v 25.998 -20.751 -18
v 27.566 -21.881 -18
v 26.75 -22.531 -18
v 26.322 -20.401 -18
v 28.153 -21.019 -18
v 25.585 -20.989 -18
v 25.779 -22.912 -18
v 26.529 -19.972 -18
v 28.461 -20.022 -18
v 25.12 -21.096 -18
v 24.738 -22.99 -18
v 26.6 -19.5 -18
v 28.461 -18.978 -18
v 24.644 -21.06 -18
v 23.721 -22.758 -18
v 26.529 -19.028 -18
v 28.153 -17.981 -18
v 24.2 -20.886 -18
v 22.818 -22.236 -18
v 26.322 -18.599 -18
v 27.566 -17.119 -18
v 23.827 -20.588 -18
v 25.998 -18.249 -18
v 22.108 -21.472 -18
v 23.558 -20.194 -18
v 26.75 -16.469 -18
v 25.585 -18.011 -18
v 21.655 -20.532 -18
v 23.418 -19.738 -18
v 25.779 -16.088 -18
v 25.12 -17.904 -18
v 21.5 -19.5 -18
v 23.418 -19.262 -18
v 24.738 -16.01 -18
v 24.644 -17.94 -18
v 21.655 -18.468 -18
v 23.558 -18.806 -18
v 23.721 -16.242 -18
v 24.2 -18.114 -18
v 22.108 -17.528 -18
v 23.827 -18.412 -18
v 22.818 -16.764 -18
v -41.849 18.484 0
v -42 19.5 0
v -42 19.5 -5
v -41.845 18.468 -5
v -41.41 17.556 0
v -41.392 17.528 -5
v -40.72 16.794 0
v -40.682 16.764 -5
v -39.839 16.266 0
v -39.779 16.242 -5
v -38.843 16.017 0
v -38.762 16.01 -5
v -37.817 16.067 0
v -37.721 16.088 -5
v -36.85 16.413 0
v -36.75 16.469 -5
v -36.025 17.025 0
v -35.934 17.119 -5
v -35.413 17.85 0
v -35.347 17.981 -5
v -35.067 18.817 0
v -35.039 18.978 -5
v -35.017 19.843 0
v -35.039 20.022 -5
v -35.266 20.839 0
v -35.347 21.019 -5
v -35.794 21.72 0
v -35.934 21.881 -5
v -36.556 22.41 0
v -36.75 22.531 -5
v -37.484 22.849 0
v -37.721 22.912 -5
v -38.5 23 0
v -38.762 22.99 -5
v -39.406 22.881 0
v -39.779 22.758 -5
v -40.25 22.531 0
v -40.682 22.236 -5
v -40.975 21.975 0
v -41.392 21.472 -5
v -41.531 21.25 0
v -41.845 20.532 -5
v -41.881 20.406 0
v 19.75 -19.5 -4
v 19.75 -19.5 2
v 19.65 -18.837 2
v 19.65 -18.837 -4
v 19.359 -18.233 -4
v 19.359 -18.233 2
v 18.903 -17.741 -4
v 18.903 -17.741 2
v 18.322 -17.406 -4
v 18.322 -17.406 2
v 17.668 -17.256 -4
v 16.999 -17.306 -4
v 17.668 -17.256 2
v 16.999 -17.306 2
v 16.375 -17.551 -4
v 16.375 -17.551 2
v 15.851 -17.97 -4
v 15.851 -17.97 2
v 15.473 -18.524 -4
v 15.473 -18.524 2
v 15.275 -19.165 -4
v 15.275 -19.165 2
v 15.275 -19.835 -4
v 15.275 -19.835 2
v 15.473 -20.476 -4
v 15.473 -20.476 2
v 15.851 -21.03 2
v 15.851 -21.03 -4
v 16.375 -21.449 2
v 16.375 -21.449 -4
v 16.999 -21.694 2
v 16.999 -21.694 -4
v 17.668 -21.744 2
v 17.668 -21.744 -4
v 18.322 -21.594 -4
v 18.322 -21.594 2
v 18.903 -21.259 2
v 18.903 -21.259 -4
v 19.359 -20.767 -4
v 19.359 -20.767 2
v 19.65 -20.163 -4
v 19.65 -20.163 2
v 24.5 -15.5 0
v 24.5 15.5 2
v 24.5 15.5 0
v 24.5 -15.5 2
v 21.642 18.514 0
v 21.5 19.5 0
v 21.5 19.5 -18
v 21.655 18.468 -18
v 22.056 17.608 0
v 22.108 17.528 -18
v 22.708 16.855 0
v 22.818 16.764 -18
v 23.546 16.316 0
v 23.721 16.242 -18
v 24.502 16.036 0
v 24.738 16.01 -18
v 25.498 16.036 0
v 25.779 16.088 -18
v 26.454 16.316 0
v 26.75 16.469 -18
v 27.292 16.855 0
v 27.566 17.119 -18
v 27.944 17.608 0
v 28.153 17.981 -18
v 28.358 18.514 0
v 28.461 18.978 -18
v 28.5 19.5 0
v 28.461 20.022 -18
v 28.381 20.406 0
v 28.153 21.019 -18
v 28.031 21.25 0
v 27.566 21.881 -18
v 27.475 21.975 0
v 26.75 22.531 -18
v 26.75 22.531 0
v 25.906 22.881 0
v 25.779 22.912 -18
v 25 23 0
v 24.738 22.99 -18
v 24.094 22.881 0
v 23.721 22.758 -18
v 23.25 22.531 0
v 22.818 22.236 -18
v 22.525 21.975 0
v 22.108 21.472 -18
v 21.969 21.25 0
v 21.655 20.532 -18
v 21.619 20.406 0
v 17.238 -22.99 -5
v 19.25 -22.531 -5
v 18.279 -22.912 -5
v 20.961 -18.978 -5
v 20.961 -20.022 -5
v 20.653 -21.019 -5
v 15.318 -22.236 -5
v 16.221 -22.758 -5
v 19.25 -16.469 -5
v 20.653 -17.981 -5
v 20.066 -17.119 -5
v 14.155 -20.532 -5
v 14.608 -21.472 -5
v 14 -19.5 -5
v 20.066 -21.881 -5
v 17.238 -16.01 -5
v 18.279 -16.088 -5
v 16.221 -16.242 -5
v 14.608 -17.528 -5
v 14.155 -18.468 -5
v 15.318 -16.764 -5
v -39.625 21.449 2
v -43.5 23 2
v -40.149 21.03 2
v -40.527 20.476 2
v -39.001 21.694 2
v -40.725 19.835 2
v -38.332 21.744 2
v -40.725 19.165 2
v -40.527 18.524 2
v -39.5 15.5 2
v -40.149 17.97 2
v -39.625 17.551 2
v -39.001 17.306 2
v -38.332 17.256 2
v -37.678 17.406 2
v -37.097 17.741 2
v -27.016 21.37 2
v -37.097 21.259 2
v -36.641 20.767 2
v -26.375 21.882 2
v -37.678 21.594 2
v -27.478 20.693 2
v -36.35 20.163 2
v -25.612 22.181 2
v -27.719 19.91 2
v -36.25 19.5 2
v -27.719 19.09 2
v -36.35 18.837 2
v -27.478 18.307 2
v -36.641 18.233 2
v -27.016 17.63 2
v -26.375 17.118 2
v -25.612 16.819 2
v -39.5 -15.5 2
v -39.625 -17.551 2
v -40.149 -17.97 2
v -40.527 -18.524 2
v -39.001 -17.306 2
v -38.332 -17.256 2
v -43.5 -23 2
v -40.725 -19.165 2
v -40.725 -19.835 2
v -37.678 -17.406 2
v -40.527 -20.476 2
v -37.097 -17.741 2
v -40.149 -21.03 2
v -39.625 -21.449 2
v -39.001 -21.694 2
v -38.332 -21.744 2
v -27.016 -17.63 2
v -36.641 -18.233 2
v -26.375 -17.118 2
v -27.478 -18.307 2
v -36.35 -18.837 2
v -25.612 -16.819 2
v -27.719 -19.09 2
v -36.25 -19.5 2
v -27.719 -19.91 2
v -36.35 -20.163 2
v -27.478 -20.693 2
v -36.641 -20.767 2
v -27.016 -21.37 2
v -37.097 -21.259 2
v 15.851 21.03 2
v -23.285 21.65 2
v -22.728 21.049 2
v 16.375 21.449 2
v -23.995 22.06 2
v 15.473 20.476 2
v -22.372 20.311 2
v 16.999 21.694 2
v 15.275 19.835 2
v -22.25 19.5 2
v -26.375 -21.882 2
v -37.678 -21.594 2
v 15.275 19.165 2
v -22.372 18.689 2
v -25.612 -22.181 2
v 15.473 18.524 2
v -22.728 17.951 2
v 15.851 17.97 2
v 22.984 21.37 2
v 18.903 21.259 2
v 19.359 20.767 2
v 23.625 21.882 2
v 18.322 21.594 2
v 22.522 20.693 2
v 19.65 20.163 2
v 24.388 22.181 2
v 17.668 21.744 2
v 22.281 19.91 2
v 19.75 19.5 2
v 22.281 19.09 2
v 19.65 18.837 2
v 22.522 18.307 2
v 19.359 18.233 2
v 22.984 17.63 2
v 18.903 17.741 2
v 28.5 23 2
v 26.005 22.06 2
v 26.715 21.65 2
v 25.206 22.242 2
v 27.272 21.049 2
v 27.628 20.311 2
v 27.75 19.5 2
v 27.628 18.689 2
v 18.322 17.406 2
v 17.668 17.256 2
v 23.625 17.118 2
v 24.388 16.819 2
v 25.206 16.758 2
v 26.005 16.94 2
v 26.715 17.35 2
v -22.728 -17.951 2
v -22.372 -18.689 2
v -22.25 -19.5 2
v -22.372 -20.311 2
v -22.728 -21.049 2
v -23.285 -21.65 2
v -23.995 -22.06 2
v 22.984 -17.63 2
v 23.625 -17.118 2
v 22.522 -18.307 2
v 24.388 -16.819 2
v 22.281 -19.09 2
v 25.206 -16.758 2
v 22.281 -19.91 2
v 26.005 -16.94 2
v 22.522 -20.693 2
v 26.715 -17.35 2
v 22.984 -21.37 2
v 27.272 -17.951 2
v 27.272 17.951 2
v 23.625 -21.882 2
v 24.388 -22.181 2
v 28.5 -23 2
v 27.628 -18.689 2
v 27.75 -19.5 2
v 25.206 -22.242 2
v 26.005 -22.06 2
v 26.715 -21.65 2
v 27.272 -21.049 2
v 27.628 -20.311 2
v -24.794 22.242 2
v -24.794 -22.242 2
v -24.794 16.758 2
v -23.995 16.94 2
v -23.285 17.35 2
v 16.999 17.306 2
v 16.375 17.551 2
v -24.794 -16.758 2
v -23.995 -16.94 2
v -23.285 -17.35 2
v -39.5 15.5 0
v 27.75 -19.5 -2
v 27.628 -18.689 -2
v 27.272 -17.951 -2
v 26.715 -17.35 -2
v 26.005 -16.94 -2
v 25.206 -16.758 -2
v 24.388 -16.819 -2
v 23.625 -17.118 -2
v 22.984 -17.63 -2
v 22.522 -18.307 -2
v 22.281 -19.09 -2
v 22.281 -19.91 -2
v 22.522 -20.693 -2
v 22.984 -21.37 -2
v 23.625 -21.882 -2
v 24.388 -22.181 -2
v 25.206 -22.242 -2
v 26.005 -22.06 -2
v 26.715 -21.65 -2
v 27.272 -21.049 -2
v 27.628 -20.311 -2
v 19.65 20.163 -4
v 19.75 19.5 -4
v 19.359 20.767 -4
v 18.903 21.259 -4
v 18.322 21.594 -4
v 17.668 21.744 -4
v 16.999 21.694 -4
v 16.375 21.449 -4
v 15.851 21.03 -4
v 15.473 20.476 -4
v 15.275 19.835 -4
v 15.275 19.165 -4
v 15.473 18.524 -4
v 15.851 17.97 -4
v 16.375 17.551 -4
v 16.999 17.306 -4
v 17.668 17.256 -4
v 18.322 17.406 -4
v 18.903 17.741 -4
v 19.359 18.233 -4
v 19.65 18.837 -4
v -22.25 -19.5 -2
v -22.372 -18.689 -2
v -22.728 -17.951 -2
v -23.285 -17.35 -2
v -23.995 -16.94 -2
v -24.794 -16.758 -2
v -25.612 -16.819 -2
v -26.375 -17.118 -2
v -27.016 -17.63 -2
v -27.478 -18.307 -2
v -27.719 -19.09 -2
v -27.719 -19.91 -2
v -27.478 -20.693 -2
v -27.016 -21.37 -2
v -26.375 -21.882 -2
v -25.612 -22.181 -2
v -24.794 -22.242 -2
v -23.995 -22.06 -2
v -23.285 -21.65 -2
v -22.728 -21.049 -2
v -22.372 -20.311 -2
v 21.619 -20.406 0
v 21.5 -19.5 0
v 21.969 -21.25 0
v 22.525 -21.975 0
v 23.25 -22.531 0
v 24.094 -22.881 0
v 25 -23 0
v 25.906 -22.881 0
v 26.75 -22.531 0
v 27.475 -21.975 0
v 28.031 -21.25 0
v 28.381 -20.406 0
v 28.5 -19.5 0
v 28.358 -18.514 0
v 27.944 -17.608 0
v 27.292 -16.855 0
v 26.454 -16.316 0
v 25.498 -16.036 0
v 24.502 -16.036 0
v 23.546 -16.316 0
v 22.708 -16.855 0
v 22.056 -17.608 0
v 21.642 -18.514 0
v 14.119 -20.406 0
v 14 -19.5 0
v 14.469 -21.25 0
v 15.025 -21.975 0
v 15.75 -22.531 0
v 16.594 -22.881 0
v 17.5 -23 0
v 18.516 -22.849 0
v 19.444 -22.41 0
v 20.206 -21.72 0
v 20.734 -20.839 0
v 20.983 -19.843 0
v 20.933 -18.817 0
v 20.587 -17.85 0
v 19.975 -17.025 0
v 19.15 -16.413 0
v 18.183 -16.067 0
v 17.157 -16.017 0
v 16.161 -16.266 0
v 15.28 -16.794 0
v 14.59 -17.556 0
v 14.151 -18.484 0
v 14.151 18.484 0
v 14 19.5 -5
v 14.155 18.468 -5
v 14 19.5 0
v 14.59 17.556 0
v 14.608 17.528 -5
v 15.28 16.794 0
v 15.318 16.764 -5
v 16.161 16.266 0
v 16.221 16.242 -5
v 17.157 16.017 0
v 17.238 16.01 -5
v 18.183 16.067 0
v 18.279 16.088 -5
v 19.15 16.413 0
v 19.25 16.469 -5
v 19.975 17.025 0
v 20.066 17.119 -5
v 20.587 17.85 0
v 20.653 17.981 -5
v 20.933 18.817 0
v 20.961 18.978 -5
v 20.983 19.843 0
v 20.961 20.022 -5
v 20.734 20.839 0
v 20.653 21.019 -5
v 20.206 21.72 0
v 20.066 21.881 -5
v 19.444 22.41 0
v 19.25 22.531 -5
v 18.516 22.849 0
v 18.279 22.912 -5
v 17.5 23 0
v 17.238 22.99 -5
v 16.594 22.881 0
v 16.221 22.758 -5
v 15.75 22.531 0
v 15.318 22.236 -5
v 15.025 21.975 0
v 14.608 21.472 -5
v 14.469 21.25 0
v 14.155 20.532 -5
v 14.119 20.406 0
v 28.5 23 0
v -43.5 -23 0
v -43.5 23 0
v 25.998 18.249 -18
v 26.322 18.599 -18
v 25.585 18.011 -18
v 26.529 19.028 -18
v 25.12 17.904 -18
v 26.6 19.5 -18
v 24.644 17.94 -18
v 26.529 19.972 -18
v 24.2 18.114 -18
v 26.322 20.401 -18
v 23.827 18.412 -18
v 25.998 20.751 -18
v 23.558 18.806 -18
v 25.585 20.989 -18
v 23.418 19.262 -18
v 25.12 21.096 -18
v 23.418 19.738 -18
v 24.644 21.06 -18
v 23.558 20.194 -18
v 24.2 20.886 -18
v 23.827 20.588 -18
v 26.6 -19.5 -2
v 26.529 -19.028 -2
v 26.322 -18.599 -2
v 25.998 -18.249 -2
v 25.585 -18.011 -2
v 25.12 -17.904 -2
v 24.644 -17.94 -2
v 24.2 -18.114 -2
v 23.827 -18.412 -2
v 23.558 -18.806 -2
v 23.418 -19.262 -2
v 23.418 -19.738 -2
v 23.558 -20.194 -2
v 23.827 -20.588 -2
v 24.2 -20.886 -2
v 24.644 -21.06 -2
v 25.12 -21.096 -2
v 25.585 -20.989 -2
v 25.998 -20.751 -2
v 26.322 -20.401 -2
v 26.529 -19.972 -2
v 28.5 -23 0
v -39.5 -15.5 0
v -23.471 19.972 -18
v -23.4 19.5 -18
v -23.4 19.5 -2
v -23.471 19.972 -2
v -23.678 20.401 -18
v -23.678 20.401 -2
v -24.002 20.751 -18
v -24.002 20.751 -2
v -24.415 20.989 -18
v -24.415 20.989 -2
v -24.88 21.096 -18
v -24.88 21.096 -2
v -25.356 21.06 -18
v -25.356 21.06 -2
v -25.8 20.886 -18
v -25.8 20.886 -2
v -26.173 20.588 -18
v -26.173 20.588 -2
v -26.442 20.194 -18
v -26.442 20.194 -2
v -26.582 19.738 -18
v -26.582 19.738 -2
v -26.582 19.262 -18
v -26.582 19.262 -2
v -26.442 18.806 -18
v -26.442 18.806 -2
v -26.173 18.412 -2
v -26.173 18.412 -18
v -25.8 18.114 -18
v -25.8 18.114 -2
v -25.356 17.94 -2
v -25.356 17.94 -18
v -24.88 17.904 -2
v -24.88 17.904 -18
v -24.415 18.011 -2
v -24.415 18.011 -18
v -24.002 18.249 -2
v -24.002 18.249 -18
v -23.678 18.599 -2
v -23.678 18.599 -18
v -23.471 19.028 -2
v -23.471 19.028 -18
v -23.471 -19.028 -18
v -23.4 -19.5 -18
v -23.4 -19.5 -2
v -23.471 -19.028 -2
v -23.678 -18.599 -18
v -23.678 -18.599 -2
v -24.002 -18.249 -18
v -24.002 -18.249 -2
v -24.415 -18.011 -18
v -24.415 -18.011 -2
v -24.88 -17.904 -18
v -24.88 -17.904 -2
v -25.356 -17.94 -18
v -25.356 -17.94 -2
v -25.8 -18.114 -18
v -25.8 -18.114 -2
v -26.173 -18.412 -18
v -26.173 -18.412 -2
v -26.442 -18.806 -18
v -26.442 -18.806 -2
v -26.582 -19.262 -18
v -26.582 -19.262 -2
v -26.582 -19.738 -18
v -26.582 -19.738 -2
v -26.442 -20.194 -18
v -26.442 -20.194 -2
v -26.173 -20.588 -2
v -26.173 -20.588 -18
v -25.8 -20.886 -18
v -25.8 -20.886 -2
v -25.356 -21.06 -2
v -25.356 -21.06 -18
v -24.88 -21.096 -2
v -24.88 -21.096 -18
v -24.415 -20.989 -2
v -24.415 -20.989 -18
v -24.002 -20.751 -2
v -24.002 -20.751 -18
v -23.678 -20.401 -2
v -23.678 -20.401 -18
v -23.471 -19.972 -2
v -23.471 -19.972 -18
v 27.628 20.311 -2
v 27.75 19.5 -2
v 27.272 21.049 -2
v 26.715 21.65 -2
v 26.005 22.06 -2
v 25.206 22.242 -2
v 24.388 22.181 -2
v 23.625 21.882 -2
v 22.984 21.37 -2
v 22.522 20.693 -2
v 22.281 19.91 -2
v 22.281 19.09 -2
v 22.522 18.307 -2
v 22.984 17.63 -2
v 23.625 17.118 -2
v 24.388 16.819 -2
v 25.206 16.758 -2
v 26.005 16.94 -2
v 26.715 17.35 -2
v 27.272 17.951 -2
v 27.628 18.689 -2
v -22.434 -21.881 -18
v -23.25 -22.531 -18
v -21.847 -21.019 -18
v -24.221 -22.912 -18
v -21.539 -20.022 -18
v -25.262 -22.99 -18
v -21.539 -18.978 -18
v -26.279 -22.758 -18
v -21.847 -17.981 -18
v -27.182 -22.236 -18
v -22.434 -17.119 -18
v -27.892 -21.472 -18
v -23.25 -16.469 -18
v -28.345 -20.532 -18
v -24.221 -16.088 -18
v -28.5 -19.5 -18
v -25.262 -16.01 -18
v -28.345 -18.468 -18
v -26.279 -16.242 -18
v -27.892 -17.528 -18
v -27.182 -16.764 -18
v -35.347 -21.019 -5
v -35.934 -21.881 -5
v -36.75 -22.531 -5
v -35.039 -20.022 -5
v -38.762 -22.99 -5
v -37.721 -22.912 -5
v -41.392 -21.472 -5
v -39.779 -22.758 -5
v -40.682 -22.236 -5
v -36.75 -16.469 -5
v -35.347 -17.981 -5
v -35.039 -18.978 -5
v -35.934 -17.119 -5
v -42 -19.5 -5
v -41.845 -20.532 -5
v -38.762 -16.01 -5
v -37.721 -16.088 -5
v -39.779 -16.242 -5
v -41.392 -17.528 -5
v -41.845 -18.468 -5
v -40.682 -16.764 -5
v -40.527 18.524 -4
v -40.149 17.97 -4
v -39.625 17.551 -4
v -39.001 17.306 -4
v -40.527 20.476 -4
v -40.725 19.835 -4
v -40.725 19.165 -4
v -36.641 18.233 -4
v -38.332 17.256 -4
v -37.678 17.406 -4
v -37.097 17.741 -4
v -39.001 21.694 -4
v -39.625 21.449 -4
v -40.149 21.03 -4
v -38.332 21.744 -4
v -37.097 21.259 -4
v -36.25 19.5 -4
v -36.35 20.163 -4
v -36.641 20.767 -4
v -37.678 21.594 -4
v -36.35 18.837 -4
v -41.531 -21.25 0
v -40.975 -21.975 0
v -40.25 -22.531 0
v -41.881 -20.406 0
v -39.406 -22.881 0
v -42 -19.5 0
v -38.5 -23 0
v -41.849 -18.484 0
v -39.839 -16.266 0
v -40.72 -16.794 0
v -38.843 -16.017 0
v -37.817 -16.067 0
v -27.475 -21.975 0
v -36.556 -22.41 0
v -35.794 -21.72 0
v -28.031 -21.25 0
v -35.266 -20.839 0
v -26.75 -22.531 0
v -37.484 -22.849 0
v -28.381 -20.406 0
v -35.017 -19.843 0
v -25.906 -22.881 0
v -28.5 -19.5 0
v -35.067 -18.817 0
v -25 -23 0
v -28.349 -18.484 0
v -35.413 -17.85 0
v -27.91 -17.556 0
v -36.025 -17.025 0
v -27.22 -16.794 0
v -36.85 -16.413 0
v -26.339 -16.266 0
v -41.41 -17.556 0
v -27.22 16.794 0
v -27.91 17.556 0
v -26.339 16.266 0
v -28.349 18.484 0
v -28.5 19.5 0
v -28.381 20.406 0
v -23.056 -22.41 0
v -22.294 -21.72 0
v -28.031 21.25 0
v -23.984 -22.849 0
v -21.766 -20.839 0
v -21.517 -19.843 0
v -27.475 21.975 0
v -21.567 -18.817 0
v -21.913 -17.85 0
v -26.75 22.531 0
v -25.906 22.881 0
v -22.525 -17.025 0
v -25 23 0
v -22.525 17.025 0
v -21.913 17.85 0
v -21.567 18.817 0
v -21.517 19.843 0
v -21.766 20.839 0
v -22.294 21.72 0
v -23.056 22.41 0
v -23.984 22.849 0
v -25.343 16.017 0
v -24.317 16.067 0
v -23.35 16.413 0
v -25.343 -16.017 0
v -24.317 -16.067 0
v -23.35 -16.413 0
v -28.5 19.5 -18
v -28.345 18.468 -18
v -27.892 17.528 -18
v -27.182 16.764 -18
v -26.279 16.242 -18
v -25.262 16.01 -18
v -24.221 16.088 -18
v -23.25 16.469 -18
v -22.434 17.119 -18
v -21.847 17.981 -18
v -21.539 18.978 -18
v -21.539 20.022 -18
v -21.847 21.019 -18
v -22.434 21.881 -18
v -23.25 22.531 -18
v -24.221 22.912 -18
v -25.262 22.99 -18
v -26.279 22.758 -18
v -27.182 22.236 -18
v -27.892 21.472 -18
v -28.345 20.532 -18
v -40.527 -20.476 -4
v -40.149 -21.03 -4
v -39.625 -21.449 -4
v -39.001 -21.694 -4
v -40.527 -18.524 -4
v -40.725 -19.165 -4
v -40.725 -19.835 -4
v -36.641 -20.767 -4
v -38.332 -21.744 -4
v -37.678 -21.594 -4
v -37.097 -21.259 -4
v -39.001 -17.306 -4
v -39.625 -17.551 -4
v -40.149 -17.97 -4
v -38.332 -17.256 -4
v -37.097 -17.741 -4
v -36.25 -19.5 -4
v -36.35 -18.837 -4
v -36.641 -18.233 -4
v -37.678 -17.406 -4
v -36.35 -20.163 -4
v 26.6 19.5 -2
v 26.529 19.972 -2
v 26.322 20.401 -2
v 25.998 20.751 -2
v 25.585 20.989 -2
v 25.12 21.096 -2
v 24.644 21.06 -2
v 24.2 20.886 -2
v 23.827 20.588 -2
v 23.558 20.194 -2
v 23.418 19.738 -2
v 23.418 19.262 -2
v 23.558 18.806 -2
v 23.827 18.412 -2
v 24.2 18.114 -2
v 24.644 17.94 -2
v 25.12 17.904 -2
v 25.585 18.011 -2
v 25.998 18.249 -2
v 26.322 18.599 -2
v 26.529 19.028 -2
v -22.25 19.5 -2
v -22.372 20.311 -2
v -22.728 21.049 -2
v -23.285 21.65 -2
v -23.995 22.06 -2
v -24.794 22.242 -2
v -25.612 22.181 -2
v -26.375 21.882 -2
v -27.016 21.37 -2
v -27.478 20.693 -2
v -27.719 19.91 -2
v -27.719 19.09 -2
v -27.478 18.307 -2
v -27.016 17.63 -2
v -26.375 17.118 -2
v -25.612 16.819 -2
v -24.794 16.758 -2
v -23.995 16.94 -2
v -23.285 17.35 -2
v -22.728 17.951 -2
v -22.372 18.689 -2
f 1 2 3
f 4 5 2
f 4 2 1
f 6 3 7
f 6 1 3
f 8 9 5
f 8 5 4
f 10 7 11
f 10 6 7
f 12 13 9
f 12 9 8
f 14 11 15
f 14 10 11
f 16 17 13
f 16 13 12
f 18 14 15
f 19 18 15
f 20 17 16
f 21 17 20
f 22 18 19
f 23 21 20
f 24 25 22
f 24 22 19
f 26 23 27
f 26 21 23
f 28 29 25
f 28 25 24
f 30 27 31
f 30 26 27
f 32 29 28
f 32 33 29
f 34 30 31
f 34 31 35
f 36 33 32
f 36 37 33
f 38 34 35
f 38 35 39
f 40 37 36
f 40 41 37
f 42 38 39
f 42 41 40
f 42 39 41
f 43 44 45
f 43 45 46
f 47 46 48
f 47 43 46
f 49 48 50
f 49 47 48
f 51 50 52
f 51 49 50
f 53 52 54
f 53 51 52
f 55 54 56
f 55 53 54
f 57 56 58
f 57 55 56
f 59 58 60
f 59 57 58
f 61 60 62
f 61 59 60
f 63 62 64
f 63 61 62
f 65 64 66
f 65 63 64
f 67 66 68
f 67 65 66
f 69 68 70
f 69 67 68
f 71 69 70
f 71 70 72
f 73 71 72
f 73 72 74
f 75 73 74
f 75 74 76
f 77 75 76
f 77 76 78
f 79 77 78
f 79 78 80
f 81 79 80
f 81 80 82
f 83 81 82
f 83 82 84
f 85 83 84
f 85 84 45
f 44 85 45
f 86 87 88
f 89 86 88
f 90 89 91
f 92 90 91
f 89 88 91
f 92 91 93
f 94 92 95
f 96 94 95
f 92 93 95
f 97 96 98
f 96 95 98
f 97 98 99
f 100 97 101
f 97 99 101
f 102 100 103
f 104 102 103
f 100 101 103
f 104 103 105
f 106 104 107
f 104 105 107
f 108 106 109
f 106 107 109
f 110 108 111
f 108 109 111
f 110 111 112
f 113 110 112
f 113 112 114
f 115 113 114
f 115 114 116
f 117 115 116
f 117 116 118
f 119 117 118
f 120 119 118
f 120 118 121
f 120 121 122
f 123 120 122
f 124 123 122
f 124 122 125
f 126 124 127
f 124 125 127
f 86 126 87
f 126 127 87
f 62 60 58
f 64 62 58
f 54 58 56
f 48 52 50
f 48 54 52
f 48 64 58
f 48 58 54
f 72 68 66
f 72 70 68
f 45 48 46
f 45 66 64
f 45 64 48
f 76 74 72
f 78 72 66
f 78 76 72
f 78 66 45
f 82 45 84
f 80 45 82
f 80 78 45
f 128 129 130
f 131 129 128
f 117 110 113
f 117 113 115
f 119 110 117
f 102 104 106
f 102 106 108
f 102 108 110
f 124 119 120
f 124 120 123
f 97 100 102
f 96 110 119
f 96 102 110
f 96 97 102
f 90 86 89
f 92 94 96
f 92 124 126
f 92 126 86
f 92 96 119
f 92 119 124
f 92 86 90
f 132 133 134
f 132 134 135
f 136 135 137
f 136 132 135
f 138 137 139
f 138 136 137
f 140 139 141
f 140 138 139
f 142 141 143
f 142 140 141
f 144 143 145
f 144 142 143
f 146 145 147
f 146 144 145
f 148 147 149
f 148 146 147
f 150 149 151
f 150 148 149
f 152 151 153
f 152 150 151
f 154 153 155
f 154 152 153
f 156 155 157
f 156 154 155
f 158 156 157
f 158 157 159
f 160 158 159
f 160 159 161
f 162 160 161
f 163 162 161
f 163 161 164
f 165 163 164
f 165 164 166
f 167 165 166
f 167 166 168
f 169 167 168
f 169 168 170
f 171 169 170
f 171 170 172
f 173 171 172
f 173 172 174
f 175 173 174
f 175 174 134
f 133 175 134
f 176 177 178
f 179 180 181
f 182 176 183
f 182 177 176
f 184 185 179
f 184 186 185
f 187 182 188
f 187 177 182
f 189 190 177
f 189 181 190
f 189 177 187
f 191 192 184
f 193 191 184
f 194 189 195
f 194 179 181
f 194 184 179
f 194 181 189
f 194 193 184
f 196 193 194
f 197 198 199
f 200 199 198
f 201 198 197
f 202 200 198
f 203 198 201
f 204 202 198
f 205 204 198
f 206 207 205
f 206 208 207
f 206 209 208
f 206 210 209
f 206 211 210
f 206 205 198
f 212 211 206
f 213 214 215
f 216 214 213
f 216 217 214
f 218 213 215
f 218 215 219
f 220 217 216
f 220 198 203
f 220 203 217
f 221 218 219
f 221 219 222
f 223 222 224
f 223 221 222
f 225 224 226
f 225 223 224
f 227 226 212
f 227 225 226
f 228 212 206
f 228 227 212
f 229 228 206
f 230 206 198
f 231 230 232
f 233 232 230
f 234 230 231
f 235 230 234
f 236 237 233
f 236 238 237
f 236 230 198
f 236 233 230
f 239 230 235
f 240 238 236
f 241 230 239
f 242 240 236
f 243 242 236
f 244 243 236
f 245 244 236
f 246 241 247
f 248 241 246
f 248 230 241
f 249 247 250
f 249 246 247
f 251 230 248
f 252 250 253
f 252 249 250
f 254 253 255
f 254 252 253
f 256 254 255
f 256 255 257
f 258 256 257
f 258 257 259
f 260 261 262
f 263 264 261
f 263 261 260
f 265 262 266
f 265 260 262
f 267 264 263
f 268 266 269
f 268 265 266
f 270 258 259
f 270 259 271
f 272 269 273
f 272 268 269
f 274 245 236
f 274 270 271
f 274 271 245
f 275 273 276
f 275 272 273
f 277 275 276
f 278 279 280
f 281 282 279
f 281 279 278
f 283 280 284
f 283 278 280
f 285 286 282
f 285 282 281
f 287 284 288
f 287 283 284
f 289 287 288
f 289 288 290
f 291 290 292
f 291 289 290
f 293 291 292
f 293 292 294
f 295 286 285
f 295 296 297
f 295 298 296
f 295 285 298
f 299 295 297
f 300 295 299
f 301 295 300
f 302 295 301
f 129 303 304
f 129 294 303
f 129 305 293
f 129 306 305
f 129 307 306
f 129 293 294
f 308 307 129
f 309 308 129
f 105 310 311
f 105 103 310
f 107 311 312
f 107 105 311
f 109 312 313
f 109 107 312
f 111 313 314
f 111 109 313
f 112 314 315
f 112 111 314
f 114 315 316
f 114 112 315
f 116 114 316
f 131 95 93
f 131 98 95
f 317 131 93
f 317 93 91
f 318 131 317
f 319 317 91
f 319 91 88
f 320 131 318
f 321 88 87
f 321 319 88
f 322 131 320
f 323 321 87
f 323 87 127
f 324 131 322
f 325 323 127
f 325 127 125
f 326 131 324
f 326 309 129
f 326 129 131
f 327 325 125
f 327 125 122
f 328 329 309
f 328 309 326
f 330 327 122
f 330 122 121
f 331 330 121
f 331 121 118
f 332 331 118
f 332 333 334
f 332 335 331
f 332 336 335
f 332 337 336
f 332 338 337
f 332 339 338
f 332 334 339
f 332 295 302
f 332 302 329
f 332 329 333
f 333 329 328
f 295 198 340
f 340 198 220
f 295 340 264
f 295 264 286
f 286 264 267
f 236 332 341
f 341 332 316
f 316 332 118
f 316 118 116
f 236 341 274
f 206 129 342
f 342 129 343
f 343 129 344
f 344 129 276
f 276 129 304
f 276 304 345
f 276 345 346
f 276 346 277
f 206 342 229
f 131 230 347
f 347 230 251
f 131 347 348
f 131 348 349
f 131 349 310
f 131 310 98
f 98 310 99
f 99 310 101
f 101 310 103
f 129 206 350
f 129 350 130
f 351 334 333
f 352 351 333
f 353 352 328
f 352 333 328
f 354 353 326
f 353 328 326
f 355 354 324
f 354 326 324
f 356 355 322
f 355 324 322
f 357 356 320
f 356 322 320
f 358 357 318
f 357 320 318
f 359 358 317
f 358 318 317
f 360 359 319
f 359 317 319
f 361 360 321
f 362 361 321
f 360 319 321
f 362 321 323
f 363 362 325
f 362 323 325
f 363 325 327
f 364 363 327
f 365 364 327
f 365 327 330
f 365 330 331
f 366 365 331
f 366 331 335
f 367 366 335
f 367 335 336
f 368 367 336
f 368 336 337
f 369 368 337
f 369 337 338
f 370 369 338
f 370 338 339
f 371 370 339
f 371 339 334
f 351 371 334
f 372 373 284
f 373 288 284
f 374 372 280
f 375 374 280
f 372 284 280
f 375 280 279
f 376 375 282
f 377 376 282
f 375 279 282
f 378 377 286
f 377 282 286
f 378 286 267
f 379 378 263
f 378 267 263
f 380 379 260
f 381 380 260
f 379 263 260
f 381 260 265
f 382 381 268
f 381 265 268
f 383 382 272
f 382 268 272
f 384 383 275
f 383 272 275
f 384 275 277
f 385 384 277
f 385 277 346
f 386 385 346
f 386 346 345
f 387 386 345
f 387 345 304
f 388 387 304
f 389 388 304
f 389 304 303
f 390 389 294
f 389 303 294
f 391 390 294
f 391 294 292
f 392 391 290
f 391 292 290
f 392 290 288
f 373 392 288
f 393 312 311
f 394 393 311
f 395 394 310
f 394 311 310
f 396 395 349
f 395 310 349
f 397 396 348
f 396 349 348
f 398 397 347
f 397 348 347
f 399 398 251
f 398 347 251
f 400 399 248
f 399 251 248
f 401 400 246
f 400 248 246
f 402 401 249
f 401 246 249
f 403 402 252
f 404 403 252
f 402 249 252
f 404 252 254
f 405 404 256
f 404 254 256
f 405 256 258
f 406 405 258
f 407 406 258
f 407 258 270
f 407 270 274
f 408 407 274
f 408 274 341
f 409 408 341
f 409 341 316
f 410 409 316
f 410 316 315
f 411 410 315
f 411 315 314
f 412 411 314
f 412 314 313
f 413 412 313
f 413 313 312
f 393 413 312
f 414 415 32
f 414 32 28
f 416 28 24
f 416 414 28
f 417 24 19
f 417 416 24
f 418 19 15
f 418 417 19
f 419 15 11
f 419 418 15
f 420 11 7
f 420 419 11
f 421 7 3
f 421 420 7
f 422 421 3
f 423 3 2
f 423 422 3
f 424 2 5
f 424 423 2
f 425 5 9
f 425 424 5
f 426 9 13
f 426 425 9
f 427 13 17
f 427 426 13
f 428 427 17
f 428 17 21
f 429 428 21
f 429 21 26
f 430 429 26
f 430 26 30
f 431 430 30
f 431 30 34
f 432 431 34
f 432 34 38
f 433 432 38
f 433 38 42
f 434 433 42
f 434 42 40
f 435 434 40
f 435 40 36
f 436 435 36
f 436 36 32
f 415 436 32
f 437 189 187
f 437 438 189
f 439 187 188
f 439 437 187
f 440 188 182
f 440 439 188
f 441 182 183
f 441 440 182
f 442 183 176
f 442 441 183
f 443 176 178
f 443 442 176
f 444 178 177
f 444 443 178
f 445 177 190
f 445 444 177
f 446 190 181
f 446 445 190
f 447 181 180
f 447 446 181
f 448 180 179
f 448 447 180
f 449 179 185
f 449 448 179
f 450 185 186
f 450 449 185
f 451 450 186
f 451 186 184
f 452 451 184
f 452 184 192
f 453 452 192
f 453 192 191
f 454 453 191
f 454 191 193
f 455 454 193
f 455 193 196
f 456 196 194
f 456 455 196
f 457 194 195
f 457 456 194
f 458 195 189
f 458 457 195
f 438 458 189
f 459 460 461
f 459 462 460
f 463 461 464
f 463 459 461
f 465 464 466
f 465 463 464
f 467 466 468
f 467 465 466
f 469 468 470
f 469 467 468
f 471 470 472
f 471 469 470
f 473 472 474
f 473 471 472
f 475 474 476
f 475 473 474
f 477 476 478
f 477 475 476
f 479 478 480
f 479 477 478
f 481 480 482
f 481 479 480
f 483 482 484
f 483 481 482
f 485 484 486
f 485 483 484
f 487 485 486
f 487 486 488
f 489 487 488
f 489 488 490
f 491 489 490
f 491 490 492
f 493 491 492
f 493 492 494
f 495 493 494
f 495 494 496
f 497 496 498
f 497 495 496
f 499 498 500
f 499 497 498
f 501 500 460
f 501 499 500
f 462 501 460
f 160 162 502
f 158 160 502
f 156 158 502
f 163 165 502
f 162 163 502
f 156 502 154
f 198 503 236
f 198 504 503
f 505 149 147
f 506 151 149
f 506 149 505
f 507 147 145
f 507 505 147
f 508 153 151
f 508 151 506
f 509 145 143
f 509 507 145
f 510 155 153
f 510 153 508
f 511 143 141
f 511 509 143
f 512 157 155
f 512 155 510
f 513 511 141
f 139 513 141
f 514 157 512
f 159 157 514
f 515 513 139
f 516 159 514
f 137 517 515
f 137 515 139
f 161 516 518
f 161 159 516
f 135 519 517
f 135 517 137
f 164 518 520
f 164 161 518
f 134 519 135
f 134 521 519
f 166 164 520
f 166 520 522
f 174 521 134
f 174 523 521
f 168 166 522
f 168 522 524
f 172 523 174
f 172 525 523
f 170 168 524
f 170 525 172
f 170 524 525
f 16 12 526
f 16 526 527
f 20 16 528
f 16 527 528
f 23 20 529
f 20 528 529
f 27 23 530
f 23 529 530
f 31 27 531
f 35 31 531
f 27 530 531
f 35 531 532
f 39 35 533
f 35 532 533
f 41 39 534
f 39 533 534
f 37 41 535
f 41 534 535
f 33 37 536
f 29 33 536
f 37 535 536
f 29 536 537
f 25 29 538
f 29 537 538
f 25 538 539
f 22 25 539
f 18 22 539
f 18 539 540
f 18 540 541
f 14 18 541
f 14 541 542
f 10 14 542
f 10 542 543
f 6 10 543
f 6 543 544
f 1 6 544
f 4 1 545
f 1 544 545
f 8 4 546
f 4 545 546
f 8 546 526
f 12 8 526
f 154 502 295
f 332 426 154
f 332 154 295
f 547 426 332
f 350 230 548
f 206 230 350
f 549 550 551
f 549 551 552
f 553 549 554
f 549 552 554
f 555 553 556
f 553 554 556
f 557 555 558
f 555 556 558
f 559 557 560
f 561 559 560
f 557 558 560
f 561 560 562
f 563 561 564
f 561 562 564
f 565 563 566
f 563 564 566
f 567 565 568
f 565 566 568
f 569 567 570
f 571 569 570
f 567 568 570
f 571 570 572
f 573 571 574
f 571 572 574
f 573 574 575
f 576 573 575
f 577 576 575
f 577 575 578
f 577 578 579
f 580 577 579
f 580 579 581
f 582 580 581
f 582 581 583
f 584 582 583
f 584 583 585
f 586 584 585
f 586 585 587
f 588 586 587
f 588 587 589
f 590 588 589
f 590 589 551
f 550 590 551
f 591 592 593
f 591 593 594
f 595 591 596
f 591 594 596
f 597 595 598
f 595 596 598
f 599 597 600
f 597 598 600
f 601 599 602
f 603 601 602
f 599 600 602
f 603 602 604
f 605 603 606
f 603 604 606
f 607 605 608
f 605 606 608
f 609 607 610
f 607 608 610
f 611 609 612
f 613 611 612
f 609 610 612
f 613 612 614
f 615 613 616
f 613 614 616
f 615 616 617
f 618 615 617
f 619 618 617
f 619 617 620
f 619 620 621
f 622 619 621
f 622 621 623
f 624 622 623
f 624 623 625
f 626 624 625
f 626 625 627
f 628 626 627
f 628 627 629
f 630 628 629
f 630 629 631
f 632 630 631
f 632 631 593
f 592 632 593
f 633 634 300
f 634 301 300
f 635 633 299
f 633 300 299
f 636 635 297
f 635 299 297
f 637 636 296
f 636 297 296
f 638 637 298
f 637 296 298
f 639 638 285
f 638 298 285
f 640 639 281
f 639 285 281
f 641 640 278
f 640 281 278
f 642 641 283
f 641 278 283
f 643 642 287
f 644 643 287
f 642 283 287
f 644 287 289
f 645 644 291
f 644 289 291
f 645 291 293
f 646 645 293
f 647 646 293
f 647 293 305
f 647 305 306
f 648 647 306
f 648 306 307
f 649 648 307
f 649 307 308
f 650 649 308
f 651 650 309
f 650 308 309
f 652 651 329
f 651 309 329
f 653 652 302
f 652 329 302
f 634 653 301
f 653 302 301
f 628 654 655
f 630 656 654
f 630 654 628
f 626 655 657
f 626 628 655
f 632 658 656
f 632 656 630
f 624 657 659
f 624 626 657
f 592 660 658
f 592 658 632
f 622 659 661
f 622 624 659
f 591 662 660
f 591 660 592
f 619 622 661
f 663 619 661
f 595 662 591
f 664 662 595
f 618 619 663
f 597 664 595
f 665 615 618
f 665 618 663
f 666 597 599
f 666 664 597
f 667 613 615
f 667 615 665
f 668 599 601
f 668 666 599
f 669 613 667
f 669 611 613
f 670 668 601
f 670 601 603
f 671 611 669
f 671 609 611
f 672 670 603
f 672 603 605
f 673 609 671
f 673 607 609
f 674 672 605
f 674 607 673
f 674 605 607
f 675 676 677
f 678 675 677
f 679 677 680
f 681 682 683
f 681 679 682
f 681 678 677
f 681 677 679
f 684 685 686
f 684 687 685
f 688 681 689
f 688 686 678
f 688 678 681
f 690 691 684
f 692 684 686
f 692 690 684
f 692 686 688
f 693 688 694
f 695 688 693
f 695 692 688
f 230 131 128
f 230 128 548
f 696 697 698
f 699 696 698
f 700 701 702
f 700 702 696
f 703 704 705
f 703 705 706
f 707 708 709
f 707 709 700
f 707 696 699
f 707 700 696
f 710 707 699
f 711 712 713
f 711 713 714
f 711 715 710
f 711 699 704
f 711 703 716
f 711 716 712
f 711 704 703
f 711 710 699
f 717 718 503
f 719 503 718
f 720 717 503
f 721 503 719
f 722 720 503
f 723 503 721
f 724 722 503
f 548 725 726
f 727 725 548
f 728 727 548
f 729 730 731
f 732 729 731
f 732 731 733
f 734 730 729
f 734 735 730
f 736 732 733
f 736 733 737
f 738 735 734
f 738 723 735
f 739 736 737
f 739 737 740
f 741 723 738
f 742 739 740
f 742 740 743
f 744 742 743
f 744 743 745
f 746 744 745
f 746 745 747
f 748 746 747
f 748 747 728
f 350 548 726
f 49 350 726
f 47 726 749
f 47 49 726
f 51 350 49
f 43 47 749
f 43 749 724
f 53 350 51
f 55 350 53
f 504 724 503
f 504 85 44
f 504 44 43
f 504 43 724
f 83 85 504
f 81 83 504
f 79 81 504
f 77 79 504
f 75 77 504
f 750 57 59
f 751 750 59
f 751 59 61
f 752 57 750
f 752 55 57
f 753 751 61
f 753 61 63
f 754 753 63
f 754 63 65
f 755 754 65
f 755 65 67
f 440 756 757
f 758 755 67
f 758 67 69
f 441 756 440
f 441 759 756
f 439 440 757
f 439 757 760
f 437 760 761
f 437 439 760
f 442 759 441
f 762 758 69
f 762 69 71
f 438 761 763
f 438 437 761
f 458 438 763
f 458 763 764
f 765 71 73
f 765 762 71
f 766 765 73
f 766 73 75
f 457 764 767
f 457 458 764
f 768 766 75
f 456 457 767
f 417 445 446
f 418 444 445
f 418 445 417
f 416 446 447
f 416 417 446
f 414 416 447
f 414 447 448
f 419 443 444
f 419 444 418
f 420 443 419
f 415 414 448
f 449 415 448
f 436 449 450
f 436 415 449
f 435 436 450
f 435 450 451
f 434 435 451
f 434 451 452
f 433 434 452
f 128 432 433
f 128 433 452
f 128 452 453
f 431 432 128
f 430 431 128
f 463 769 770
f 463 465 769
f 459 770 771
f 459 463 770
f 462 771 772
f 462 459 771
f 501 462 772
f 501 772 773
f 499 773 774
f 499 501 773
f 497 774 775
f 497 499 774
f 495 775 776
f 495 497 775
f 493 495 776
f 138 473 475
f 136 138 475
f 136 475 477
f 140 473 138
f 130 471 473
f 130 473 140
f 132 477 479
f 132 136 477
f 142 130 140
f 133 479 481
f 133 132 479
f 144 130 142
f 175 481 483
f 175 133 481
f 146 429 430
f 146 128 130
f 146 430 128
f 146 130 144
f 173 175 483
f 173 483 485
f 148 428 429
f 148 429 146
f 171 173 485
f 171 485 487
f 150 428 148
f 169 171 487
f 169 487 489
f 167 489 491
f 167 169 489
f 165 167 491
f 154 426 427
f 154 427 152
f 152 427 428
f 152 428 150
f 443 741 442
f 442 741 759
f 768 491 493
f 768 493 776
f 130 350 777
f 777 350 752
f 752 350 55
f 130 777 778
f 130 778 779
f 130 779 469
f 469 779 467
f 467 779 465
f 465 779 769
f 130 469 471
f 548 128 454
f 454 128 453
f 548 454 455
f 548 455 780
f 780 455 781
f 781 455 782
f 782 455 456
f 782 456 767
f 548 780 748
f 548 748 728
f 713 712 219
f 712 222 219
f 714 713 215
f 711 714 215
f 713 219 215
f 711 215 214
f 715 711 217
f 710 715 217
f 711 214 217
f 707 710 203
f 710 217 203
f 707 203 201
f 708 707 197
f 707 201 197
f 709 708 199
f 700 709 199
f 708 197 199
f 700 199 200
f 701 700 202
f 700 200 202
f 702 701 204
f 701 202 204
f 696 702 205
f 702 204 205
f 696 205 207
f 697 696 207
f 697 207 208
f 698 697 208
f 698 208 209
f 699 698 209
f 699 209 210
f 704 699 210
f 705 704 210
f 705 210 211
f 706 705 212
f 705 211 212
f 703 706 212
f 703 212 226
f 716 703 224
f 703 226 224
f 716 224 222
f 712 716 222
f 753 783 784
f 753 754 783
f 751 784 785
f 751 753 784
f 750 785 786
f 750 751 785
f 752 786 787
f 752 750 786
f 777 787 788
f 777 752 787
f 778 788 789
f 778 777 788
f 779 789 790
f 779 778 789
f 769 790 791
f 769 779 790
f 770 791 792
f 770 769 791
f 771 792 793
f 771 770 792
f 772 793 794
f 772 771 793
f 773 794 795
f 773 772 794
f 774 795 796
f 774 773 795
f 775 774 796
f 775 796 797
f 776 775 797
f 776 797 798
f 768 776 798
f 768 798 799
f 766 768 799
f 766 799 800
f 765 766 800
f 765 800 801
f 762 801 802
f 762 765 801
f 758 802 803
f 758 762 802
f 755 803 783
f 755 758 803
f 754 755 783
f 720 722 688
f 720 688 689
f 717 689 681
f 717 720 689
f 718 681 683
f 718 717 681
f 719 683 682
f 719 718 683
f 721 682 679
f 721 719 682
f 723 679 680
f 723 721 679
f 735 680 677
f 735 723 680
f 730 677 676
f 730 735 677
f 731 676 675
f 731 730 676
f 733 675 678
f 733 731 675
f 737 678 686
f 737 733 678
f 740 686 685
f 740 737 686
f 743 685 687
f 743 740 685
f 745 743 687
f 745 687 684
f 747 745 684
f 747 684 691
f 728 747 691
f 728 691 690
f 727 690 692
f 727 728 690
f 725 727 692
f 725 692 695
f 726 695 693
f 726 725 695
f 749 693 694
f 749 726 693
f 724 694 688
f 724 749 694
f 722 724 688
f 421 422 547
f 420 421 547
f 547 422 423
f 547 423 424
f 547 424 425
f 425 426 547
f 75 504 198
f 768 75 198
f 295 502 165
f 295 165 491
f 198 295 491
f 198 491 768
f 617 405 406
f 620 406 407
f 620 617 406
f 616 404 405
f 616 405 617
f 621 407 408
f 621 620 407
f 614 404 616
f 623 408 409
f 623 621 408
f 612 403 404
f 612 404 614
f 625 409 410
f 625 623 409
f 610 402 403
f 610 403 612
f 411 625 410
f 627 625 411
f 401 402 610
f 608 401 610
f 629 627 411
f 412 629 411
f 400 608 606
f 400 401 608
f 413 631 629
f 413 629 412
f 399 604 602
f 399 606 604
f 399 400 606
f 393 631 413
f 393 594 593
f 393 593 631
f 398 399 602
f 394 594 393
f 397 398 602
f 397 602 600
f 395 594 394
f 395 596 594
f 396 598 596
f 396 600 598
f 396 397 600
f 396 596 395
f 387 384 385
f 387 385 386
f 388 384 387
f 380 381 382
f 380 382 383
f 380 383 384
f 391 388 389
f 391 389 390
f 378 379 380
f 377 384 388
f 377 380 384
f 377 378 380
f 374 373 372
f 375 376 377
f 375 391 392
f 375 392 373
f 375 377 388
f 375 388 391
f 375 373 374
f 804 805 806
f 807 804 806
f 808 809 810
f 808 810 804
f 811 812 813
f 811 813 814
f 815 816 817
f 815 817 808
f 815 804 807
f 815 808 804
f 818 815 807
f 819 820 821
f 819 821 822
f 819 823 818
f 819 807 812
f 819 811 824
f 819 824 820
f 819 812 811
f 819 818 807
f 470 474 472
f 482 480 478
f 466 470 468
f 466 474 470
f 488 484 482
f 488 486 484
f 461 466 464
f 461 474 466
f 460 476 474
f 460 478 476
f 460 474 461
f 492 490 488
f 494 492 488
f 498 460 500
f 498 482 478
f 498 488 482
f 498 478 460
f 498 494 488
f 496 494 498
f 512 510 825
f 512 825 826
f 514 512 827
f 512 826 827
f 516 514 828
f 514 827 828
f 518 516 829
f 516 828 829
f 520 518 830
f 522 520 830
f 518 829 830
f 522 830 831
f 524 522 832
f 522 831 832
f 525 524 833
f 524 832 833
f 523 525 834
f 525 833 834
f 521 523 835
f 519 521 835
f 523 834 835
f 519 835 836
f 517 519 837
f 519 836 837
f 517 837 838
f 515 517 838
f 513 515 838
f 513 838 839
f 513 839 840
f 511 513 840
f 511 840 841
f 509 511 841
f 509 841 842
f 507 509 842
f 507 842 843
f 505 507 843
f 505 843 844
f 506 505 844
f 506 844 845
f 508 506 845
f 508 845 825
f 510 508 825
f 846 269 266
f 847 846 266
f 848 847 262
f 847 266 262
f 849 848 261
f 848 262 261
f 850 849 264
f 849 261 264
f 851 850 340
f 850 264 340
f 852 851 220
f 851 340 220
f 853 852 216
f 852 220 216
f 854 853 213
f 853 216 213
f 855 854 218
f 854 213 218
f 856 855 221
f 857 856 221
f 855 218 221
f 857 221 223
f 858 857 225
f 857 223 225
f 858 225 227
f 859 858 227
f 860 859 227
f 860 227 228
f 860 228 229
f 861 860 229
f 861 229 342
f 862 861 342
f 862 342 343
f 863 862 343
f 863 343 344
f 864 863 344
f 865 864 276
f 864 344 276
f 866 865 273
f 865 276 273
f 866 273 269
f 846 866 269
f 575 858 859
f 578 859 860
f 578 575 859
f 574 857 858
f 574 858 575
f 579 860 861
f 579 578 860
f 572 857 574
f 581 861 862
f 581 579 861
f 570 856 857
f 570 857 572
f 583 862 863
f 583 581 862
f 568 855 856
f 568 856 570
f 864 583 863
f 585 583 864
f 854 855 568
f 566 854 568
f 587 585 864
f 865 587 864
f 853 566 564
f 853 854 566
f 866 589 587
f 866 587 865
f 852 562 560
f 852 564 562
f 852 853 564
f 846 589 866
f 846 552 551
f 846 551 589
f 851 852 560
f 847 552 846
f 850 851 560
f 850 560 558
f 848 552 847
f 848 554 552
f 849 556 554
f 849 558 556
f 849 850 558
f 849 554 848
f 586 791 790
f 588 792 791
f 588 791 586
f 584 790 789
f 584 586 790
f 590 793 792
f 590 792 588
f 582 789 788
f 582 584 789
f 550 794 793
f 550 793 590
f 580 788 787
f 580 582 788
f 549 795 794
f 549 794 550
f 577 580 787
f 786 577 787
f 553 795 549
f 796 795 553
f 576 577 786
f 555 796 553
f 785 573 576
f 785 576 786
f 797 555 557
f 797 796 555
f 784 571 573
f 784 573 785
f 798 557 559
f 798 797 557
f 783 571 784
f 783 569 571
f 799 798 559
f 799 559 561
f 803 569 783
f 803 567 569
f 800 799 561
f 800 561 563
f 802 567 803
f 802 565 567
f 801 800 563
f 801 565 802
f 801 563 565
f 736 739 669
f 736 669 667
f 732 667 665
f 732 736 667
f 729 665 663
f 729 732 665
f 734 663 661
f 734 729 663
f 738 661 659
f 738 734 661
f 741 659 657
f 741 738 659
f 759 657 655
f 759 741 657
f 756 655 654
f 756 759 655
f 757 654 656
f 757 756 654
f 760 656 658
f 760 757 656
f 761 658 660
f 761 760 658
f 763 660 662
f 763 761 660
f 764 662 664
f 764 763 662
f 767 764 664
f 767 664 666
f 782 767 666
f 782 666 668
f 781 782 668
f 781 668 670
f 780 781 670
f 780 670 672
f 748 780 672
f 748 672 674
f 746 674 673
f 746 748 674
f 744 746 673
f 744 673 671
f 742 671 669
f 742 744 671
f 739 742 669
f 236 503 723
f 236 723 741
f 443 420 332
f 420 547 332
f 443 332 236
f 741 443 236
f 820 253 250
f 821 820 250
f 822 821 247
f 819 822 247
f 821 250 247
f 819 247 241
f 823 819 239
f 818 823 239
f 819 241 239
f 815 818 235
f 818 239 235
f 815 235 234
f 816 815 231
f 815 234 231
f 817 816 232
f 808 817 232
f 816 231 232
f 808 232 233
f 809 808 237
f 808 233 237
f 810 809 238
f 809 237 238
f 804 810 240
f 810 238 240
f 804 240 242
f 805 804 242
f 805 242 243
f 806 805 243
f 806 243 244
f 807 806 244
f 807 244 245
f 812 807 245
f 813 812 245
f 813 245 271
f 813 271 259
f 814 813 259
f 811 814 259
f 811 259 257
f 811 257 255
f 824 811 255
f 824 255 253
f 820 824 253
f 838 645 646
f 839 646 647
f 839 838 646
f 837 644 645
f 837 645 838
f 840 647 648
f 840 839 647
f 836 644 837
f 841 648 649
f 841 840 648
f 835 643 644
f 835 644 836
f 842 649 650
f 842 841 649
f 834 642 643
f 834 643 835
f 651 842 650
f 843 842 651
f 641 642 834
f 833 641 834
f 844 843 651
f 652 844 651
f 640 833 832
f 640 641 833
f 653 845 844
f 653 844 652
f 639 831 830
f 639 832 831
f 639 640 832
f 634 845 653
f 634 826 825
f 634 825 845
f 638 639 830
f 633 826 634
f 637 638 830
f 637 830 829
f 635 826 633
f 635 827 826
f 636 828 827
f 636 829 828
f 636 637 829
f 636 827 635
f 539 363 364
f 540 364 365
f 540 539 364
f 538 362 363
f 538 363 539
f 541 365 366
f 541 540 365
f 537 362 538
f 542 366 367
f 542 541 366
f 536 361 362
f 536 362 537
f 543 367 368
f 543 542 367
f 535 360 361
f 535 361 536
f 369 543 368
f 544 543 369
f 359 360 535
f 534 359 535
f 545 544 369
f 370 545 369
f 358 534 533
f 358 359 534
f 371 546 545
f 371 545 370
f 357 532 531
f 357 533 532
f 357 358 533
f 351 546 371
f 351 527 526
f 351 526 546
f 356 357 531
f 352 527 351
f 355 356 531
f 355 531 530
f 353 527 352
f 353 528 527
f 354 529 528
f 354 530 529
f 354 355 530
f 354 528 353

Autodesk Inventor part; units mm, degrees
ref_plane "YZ Plane" through (0, 0, 0) normal (1, 0, 0) x (0, 1, 0)
ref_plane "XZ Plane" through (0, 0, 0) normal (0, 1, 0) x (-1, 0, 0)
ref_plane "XY Plane" through (0, 0, 0) normal (0, 0, 1) x (1, 0, 0)
sketch "Skizze1" plane through (0, 0, 0) normal (0, 0, 1) x (1, 0, 0)
  line L0 (-28.5, 23) -> (28.5, 23)
  line L1 (28.5, 23) -> (28.5, -23)
  line L2 (28.5, -23) -> (-28.5, -23)
  line L3 (-28.5, -23) -> (-28.5, 23)
  line L4 (0, 32.2) -> (0, -32.2) projected
  line L5 (-39.9, 0) -> (39.9, 0) projected
  point P0 (0, 0)
  point P1 (0, 23)
  point P2 (-28.5, 0)
  dimension "d0" = 57
  dimension "d1" = 46
extrude "Extrusion1" add sketch "Skizze1" along normal blind 2
sketch "Skizze2" plane through (0, 0, 0) normal (0, 0, -1) x (-1, 0, 0)
  circle A0 centre (25, -19.5) radius 3.5
  circle A1 centre (-25, -19.5) radius 3.5
  circle A2 centre (25, 19.5) radius 3.5
  circle A3 centre (-25, 19.5) radius 3.5
  line L0 (28.5, -23) -> (-28.5, -23) projected
  line L1 (28.5, 23) -> (28.5, -23) projected
  line L2 (-28.5, -23) -> (-28.5, 23) projected
  line L3 (-28.5, 23) -> (28.5, 23) projected
  point P0 (0, 0)
  dimension "d4" = 7
  dimension "d5" = 7
  dimension "d6" = 7
  dimension "d7" = 7
  dimension "d8" = 3.5
  dimension "d9" = 3.5
  dimension "d10" = 3.5
  dimension "d11" = 3.5
  dimension "d12" = 3.5
  dimension "d13" = 3.5
  dimension "d14" = 3.5
  dimension "d15" = 3.5
extrude "Extrusion2" add sketch "Skizze2" along normal blind 18 contours A0 | A2 | A1 | A3
sketch "Skizze3" plane through (0, 0, 2) normal (0, 0, 1) x (1, 0, 0)
  circle A0 centre (-25, 19.5) radius 2.75
  circle A1 centre (25, 19.5) radius 2.75
  circle A2 centre (-25, -19.5) radius 2.75
  circle A3 centre (25, -19.5) radius 2.75
  line L0 (28.5, 23) -> (-28.5, 23) projected
  line L1 (-28.5, 23) -> (-28.5, -23) projected
  line L2 (28.5, -23) -> (28.5, 23) projected
  line L3 (-28.5, -23) -> (28.5, -23) projected
  point P0 (0, 0)
  dimension "d18" = 5.5
  dimension "d19" = 5.5
  dimension "d20" = 5.5
  dimension "d21" = 5.5
  dimension "d22" = 3.5
  dimension "d23" = 3.5
  dimension "d24" = 3.5
  dimension "d25" = 3.5
  dimension "d26" = 3.5
  dimension "d27" = 3.5
  dimension "d28" = 3.5
  dimension "d29" = 3.5
extrude "Extrusion3" cut sketch "Skizze3" against normal blind 4 contours A0 | A1 | A2 | A3
sketch "Skizze4" plane through (-25, 19.5, -2) normal (0, 0, 1) x (1, 0, 0)
  circle A0 centre (0, 0) radius 2.75 projected
  circle A1 centre (0, 0) radius 1.6
  circle A2 centre (50, 0) radius 2.75 projected
  circle A3 centre (50, 0) radius 1.6
  circle A4 centre (50, -39) radius 2.75 projected
  circle A5 centre (50, -39) radius 1.6
  circle A6 centre (0, -39) radius 2.75 projected
  circle A7 centre (0, -39) radius 1.6
  point P0 (25, -19.5)
  dimension "d32" = 3.2
  dimension "d33" = 3.2
  dimension "d34" = 3.2
  dimension "d35" = 3.2
extrude "Extrusion4" cut sketch "Skizze4" against normal up to surface (16 mm away) contours A1 | A3 | A5 | A7
sketch "Skizze5" plane through (-28.5, -23, 2) normal (-1, 0, 0) x (0, 0, 1)
  line L0 (-2, 0) -> (0, 0) projected
  line L1 (0, 0) -> (-2, 0)
  line L2 (-2, 0) -> (-2, 46)
  line L3 (-2, 46) -> (0, 46)
  line L4 (0, 46) -> (0, 0)
  point P0 (-2, 23)
extrude "Extrusion5" add sketch "Skizze5" along normal blind 15
sketch "Skizze7" plane through (0, 0, 0) normal (0, 0, -1) x (-1, 0, 0)
  circle A0 centre (38.5, -19.5) radius 3.5
  line L0 (25, -23) -> (43.5, -23) projected
  line L1 (43.5, 23) -> (43.5, -23) projected
  circle A1 centre (38.5, 19.5) radius 3.5
  line L2 (25, 23) -> (43.5, 23) projected
  circle A2 centre (-17.5, 19.5) radius 3.5
  line L3 (-25, 23) -> (25, 23) projected
  line L4 (-28.5, -19.5) -> (-28.5, 19.5) projected
  circle A3 centre (-17.5, -19.5) radius 3.5
  line L5 (25, -23) -> (-25, -23) projected
  line L6 (-28.5, -23) -> (-28.5, -19.5) projected
  point P0 (0, 0)
  dimension "d53" = 7
  dimension "d54" = 3.5
  dimension "d55" = 5
  dimension "d56" = 7
  dimension "d57" = 5
  dimension "d58" = 3.5
  dimension "d59" = 7
  dimension "d60" = 3.5
  dimension "d61" = 11
  dimension "d62" = 7
  dimension "d63" = 3.5
  dimension "d64" = 11
extrude "Extrusion6" add sketch "Skizze7" along normal blind 5
sketch "Skizze6" plane through (0, 0, 2) normal (0, 0, 1) x (1, 0, 0)
  circle A0 centre (17.5, -19.5) radius 2.25
  circle A1 centre (17.5, 19.5) radius 2.25
  circle A2 centre (-38.5, -19.5) radius 2.25
  circle A3 centre (-38.5, 19.5) radius 2.25
  line L0 (-57.9, 0) -> (42.9, 0) projected
  line L1 (-43.5, -23) -> (-43.5, 23) projected
  point P0 (0, 0)
  dimension "d40" = 4.5
  dimension "d41" = 4.5
  dimension "d42" = 4.5
  dimension "d43" = 4.5
  dimension "d44" = 39
  dimension "d45" = 39
  dimension "d46" = 19.5
  dimension "d47" = 19.5
  dimension "d48" = 19.5
  dimension "d49" = 19.5
  dimension "d50" = 56
  dimension "d51" = 5
extrude "Extrusion7" cut sketch "Skizze6" against normal blind 6
sketch "Skizze8" plane through (0, 0, 2) normal (0, 0, 1) x (1, 0, 0)
  line L0 (-39.5, 15.5) -> (24.5, 15.5)
  line L1 (24.5, 15.5) -> (24.5, -15.5)
  line L2 (24.5, -15.5) -> (-39.5, -15.5)
  line L3 (-39.5, -15.5) -> (-39.5, 15.5)
  line L4 (28.5, -23) -> (28.5, 23) projected
  line L5 (28.5, 23) -> (-43.5, 23) projected
  line L6 (-43.5, -23) -> (-43.5, 23) projected
  line L7 (28.5, -23) -> (-43.5, -23) projected
  point P0 (0, 0)
  dimension "d69" = 4
  dimension "d70" = 7.5
  dimension "d71" = 4
  dimension "d72" = 7.5
extrude "Extrusion8" cut sketch "Skizze8" against normal up to surface (2 mm away) contours L0 L1 L2 L3
properties part number "_3D-Druck"
